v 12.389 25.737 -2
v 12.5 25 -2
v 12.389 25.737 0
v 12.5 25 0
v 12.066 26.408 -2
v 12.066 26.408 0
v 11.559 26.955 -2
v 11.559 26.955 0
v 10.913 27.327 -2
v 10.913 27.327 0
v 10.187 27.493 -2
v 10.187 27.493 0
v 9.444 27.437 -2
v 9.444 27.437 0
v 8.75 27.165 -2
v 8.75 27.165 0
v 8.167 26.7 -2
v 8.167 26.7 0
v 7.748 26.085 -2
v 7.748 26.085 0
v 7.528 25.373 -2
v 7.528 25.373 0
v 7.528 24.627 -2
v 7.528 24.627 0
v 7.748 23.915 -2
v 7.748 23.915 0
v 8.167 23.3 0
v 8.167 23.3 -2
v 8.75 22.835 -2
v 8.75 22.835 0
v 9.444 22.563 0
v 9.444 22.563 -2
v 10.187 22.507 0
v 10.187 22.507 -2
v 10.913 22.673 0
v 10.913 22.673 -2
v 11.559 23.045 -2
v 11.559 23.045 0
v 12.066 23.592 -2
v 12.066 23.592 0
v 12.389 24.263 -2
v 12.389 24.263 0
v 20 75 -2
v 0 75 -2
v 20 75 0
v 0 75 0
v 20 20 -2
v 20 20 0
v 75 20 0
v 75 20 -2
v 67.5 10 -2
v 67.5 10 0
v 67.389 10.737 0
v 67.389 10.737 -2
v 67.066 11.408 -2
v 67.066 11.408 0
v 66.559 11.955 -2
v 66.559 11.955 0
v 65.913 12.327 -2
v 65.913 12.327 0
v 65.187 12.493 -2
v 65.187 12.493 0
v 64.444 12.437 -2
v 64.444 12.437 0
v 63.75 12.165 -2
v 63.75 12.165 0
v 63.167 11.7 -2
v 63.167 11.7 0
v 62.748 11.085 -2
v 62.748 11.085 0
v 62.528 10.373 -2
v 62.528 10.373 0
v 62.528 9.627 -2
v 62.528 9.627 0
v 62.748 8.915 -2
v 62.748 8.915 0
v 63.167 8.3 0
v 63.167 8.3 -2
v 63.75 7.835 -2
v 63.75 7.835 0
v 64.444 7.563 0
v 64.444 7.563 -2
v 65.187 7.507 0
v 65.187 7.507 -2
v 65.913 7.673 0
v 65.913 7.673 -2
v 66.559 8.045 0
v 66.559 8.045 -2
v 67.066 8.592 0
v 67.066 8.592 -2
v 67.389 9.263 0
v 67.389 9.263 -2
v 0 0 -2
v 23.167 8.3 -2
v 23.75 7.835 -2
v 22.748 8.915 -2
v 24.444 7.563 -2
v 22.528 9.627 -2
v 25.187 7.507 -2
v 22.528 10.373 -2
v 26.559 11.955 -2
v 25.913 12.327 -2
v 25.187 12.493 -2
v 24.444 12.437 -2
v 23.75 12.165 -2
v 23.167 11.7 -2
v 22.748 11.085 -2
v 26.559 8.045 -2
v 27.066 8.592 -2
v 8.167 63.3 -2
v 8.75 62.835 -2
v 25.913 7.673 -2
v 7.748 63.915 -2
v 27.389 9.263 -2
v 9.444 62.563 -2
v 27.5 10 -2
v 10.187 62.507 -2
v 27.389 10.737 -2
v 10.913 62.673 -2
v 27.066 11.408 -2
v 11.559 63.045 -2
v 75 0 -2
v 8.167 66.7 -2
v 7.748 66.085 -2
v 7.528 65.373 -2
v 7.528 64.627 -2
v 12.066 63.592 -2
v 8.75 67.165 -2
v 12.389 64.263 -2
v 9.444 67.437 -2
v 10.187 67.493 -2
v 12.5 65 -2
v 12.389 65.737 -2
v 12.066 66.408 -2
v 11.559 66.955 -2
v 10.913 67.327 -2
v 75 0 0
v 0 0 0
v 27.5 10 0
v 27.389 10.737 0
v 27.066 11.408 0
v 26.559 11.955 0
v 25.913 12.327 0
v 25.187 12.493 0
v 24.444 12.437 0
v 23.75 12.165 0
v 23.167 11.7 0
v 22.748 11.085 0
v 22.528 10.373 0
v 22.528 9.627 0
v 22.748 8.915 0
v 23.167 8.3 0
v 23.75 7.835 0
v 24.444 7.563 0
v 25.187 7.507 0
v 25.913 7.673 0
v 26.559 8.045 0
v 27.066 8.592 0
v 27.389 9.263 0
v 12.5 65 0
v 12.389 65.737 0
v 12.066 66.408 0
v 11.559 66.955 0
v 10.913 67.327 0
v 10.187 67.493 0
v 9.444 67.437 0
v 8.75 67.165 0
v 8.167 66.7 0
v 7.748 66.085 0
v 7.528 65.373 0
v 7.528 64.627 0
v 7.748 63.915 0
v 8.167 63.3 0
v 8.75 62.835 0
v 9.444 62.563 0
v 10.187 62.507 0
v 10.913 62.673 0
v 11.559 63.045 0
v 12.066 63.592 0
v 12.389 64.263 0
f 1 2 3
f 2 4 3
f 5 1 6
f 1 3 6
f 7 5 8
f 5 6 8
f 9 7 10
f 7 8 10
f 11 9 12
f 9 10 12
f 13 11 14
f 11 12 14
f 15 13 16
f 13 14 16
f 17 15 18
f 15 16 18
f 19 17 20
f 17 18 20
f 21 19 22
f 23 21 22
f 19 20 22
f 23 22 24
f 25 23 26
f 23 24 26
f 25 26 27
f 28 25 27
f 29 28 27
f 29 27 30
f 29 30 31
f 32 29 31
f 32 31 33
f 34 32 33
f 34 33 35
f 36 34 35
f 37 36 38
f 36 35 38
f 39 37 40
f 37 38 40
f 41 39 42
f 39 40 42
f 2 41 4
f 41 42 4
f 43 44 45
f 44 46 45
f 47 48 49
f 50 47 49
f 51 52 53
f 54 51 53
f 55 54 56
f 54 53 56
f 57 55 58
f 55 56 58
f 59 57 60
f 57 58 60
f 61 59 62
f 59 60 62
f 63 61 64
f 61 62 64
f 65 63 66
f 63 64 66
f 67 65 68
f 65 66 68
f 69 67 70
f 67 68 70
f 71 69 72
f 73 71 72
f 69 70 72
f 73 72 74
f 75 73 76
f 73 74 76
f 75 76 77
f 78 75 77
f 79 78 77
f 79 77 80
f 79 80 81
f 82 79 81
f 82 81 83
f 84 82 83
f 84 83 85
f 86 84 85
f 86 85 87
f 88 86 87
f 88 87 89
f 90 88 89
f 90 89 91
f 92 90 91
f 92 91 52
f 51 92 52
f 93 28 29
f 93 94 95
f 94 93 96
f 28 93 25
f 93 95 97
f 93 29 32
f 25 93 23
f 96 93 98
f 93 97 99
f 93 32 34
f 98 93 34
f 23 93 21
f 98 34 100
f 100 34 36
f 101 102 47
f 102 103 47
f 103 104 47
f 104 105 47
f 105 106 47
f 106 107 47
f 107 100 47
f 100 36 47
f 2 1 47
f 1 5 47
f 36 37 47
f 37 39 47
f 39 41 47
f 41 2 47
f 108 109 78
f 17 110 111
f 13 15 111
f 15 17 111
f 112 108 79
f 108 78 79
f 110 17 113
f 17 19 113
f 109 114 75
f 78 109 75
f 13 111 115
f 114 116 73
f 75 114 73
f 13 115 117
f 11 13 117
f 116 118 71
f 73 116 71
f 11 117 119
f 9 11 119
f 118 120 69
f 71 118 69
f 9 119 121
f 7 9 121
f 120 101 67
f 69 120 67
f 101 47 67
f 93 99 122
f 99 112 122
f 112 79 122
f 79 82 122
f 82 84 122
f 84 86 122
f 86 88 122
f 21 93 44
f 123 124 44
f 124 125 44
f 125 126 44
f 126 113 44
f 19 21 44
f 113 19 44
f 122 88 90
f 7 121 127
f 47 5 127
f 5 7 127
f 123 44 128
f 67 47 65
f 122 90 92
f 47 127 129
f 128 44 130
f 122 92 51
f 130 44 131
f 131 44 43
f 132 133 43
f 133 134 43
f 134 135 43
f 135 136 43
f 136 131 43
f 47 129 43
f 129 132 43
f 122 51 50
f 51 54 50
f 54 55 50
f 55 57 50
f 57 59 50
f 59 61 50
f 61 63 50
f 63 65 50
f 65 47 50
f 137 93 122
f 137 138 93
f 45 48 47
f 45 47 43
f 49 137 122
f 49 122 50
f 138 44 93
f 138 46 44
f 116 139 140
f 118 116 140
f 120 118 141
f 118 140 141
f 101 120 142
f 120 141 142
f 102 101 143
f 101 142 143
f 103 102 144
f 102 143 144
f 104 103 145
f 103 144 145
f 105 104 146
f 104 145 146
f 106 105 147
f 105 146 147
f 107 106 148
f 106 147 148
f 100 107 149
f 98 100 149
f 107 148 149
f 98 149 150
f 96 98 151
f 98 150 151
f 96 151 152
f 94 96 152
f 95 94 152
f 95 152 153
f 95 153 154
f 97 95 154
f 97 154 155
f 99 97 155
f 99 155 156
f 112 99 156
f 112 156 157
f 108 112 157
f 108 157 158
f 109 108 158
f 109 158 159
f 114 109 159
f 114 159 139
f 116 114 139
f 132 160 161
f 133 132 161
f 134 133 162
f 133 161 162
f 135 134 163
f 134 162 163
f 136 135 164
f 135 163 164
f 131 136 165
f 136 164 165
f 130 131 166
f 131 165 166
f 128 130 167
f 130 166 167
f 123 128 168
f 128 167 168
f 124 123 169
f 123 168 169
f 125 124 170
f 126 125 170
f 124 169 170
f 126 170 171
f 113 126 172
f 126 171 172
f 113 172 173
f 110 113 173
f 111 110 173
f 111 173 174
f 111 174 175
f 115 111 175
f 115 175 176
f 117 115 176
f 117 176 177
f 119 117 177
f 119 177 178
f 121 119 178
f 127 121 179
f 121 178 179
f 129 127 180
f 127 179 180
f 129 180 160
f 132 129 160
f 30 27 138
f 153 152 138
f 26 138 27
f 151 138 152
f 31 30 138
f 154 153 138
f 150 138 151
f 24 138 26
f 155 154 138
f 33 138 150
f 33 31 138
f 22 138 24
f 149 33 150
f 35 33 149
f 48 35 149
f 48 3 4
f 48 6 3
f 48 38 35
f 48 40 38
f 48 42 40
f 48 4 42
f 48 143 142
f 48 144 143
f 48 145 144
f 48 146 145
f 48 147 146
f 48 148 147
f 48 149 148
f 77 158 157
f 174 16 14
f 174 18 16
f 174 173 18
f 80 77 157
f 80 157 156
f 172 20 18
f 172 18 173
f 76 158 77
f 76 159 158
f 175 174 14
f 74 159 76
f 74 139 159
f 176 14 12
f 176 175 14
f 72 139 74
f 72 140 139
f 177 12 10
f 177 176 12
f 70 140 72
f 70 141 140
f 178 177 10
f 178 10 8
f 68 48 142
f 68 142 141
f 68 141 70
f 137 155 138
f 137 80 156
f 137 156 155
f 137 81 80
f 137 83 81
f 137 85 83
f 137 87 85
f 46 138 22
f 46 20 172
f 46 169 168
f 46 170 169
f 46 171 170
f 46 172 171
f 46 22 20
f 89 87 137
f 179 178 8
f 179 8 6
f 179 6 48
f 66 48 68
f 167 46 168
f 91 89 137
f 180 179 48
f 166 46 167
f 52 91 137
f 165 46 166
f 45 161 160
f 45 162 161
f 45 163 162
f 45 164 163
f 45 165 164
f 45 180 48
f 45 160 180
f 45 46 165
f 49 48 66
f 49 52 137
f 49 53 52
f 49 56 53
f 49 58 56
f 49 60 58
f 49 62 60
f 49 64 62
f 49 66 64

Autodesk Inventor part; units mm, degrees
ref_plane "YZ Plane" through (0, 0, 0) normal (1, 0, 0) x (0, 1, 0)
ref_plane "XZ Plane" through (0, 0, 0) normal (0, 1, 0) x (-1, 0, 0)
ref_plane "XY Plane" through (0, 0, 0) normal (0, 0, 1) x (1, 0, 0)
sketch "Эскиз1" plane through (0, 0, 0) normal (0, 0, 1) x (1, 0, 0)
  line L0 (0, 0) -> (75, 0)
  line L1 (20, 20) -> (20, 75)
  line L2 (0, 75) -> (0, 0)
  line L3 (20, 20) -> (75, 20)
  circle A0 centre (10, 131.9318) radius 2.5
  circle A1 centre (10, 65) radius 2.5
  circle A2 centre (10, 25) radius 2.5
  circle A3 centre (25, 10) radius 2.5
  circle A4 centre (65, 10) radius 2.5
  line L4 (0, 75) -> (20, 75)
  line L5 (75, 0) -> (75, 20)
  point P0 (10, 75)
  point P1 (75, 10)
  dimension "d5" = 5
  dimension "d11" = 20
  dimension "d12" = 20
  dimension "d13" = 75
  dimension "d14" = 10
  dimension "d15" = 40
  dimension "d16" = 10
  dimension "d17" = 40
extrude "Выдавливание1" add sketch "Эскиз1" against normal blind 2 contours L2 L4 L1 L3 L5 L0
equation "\"d16\" = d14"
equation "\"d17\" = d15"
